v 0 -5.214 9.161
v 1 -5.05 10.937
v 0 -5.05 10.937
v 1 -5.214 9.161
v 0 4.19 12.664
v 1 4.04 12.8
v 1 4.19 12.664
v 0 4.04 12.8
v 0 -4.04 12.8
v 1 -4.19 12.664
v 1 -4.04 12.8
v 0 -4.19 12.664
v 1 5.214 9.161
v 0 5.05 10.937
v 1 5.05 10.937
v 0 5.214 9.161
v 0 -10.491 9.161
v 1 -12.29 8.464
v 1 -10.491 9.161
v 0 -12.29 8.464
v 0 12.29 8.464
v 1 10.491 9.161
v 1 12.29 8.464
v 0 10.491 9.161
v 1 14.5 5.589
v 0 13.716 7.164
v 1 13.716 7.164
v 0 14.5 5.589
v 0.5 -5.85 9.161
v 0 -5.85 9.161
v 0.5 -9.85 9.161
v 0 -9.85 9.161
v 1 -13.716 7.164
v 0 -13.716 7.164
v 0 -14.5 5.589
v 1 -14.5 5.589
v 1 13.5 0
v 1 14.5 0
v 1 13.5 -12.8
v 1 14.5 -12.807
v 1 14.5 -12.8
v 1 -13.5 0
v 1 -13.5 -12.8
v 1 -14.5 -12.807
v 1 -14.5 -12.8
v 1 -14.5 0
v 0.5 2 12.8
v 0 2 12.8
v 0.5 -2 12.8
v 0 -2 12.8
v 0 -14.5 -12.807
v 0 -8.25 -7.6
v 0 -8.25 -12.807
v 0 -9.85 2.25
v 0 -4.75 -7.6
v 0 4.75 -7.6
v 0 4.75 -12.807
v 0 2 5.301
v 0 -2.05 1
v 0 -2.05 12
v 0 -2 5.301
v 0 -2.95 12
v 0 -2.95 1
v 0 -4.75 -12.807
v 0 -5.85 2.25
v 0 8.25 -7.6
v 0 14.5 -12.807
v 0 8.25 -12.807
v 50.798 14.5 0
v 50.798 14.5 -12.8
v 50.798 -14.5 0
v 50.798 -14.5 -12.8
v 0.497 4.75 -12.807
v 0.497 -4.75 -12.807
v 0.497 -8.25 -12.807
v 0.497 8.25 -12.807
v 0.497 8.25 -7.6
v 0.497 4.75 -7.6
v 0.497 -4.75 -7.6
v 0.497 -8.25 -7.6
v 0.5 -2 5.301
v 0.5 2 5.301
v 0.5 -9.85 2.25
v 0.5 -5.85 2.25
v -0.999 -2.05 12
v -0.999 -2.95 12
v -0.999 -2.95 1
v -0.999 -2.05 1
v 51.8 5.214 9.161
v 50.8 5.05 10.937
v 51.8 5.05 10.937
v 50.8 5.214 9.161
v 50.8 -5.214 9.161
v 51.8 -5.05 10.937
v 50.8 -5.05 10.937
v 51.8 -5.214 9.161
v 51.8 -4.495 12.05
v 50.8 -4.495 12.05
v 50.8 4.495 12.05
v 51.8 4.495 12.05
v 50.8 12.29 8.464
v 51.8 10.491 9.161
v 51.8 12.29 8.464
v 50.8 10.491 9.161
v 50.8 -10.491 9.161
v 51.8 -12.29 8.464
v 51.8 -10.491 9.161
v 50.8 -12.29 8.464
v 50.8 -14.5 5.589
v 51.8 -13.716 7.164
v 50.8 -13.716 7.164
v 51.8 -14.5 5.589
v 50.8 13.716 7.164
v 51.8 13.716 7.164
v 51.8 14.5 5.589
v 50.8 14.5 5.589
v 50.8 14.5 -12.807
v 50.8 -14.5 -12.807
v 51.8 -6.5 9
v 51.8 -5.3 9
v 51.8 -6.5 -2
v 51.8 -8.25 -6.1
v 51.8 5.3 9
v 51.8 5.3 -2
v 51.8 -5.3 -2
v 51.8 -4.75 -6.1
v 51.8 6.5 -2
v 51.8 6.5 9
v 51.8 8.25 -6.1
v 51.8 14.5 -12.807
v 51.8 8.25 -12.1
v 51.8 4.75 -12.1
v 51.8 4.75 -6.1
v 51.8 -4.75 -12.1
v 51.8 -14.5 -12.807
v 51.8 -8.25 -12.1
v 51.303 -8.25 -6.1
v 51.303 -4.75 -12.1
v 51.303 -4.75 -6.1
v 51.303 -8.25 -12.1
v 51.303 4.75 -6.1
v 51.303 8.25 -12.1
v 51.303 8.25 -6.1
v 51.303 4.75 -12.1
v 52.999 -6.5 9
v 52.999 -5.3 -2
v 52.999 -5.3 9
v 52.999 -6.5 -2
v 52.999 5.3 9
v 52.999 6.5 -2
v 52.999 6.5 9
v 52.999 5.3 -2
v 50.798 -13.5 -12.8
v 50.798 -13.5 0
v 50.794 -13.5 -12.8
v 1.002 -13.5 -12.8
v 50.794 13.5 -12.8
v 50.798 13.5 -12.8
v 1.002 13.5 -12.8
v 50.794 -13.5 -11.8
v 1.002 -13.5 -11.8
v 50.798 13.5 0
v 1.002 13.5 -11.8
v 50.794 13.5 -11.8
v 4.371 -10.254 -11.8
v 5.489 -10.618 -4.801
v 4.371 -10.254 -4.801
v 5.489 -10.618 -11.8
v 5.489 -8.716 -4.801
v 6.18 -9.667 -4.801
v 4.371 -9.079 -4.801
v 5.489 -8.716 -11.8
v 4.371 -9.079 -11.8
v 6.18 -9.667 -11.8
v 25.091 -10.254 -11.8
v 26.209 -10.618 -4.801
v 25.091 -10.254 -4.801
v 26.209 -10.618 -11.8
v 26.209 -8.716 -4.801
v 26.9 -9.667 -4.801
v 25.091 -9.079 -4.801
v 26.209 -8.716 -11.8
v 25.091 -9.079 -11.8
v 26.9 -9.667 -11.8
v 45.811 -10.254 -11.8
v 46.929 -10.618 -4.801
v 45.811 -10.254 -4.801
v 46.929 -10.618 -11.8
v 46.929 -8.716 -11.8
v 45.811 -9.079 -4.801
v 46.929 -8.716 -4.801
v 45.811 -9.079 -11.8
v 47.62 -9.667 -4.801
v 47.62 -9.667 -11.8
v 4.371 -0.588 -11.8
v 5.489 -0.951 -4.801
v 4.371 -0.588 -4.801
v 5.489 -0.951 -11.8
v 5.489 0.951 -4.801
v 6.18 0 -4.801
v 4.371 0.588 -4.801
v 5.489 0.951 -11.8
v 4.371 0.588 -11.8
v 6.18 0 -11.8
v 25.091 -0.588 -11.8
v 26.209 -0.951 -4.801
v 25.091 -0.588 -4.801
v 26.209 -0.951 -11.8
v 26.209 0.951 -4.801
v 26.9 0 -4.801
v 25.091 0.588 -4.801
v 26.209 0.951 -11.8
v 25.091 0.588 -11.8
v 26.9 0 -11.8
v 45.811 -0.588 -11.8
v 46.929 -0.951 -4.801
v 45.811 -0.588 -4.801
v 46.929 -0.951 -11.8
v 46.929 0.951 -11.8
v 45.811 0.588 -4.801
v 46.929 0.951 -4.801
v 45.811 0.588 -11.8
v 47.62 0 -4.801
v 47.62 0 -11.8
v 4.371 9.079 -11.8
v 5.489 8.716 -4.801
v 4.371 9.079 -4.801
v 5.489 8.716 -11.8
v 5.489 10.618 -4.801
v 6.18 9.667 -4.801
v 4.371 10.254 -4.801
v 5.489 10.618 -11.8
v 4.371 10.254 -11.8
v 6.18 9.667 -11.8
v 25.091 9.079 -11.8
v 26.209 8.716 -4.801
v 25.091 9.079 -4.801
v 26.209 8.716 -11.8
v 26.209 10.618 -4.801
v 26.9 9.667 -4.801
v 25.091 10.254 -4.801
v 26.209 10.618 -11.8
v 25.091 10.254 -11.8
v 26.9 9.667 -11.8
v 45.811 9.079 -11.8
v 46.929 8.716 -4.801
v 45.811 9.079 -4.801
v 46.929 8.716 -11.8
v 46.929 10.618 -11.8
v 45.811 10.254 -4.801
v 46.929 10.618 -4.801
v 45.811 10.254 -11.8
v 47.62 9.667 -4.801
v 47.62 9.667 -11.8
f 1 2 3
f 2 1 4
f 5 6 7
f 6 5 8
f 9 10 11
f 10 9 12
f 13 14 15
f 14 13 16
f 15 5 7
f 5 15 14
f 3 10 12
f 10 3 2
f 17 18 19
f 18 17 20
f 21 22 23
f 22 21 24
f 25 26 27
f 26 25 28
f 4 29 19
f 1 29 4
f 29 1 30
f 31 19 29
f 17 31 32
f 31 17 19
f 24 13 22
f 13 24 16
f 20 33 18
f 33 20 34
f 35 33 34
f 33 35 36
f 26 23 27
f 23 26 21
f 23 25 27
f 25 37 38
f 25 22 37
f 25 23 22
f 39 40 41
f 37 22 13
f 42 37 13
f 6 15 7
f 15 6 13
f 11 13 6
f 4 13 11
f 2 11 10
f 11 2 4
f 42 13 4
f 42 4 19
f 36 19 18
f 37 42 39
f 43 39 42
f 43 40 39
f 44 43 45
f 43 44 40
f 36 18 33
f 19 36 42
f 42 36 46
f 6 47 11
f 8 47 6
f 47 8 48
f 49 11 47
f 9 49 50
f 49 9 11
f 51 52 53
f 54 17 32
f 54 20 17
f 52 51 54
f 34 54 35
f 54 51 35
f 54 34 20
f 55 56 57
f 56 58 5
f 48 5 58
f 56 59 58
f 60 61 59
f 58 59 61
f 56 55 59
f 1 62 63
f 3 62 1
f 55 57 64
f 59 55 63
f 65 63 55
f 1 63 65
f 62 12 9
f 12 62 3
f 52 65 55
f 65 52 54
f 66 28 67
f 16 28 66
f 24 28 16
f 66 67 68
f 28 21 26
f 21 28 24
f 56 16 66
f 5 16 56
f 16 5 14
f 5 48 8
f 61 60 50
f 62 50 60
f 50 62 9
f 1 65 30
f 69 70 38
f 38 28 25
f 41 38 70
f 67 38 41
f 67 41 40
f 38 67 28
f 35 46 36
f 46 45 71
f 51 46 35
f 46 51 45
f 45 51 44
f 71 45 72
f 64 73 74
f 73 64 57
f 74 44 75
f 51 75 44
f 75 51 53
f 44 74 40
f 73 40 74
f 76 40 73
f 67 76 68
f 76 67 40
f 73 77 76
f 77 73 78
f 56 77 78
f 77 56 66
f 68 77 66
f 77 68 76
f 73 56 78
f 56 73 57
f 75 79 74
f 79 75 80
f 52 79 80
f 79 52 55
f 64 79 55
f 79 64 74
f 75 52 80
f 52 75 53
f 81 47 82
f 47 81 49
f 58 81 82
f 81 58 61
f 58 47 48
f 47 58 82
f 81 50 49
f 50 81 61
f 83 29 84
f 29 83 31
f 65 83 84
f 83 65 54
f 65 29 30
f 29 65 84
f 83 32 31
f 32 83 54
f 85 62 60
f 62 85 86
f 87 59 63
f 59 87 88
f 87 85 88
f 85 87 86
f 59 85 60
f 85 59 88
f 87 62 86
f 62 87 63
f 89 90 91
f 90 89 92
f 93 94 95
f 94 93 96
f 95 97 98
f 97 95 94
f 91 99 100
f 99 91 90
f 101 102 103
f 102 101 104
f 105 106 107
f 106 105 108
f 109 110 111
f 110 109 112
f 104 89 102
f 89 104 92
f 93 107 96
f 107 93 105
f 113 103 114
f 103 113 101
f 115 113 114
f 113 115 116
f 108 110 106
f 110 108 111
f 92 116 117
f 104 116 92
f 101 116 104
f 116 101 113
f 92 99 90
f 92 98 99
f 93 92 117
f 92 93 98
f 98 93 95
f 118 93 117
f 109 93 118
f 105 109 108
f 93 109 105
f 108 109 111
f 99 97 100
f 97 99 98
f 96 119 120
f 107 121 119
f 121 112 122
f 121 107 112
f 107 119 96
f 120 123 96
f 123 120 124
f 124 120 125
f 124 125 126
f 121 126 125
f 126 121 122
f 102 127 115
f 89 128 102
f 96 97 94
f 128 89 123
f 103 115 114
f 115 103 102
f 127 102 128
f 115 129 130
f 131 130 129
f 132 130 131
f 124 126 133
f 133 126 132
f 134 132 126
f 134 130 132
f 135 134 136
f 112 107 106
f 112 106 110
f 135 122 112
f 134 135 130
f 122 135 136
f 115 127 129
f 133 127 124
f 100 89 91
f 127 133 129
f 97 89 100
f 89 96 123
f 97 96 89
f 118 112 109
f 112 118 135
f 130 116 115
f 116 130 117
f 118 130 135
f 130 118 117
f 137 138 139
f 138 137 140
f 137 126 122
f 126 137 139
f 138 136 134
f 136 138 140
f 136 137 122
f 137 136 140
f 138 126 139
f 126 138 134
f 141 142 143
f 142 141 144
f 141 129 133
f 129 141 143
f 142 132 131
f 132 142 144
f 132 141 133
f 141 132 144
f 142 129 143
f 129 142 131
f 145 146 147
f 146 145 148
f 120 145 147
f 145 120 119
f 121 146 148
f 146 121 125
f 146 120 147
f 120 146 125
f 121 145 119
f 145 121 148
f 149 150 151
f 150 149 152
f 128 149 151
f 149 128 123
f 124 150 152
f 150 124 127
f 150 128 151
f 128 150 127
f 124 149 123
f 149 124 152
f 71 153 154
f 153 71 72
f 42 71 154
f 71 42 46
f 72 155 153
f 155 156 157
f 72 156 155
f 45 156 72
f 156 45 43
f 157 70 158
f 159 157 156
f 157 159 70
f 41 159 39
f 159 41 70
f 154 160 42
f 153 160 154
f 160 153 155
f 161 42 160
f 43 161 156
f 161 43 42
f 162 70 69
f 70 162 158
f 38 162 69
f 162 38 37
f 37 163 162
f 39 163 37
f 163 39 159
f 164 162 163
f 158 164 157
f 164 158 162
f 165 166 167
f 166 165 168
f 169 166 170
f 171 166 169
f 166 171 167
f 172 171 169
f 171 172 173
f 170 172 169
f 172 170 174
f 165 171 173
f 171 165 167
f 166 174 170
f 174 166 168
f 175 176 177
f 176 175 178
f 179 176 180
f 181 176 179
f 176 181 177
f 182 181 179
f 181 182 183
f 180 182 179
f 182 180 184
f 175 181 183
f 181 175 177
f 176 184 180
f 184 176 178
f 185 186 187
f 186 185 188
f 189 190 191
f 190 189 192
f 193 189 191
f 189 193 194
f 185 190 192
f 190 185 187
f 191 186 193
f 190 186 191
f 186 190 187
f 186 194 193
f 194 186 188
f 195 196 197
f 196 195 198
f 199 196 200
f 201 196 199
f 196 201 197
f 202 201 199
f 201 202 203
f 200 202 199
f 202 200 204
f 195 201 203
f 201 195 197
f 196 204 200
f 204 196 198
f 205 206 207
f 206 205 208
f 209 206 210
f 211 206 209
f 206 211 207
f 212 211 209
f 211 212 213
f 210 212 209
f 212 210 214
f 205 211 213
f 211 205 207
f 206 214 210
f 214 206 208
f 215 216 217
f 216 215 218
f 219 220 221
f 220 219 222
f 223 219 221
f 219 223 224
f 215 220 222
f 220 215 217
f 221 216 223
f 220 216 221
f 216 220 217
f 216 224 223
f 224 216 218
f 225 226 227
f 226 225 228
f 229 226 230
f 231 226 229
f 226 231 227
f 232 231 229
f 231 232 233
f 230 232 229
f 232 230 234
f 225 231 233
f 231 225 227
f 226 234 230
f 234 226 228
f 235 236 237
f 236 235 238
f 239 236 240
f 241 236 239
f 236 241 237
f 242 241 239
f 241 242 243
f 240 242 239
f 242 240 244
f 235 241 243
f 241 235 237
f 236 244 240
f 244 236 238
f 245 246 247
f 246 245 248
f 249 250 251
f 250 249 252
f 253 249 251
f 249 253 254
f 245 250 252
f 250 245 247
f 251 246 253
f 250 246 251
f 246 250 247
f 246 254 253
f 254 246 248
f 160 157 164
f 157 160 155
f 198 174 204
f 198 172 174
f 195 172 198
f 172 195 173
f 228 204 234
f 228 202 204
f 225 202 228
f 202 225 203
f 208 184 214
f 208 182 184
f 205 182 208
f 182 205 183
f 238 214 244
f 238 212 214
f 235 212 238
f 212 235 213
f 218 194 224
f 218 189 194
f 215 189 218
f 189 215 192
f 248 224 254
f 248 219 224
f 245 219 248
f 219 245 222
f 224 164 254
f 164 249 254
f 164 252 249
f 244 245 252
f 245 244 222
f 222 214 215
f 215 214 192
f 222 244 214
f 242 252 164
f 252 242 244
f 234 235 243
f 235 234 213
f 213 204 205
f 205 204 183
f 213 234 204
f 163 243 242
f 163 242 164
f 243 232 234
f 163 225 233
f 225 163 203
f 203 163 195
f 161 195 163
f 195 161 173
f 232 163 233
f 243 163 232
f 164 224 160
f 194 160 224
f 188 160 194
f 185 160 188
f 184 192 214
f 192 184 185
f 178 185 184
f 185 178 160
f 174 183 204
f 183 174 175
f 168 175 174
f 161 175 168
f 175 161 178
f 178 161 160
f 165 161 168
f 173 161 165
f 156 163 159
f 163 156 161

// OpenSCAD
// file: uploads_f1_eb_f2_54_dd_Batteries.scad
/*
 * "Batteries in OpenSCAD by roman_hegglin"
 * https://www.thingiverse.com/thing:155722
 */
/*$fn=70;*/

AA();
translate( v=[15,0,0])
AAA();
translate( v=[35,0,0])
C();
translate( v=[68,0,0])
D();
translate( v=[90,-0.5*(17.5-2*2),0])
9V();
translate( v=[130,0,0])
45V();


module AA()
{
battery_round(50.5, 14.5, 1.0, 5.5);
}

module AAA()
{
battery_round(44.5, 10.5, 0.8, 3.8);
}

module C()
{
battery_round(50, 26.2, 1.5, 7.5);
}

module D()
{
battery_round(61.5, 34.2, 1.5, 9.5);
}

module 9V()
{
r=2;
union(){
	translate(v = [(26.5-2*r)/2-12.95/2, (17.5-2*r)/2, 46.4]) {
		cylinder(h = 48.5-46.4, r=3);
	}

	translate(v = [(26.5-2*r)/2+12.95/2, (17.5-2*r)/2, 46.4]) {
		for ( i = [0:3])
			{ rotate ( i * 60, [0,0,1])
				cube([7.79,4.5,(48.5-46.4)*2],center = true);
			}
		
	}

	minkowski()
	{
	 cube([26.5-2*r,17.5-2*r,46.4/2]);
	 cylinder(r=r,h=46.4/2);
}
}
}

module 45V()
{
h=67;
w=22;
l=62;



minkowski()
{
 cube([l-w/2,0.1,h/2]);
 cylinder(r=w/2,h=h/2);
}

}

module battery_round(h, dia, h_con, dia_con)
{
union() {
	cylinder(h = h-h_con, r=dia/2);
	translate(v = [0, 0, h-h_con]) {
		cylinder(h = h_con, r=dia_con/2);
	}
}
}
// main file
/*
 * 9V cell adapter for lego powered up trains. Front has contacts.
 */
 
 /*
  * It's made of 6xAAAs.
  * 
  * The casing has about 0.5mm tolerance around the AAA diameter.
  */
AAA_battery_diameter = 10.5;
AAA_battery_length = 44.5;

// Space caddy allows between battery and edge of spacer, approx
battery_diameter_tolerance = 0.5;
// Z-gap between batteries in the layers
pack_battery_height_gap = 1;

end_wall_thickness = 1;
base_thickness = 1;
side_wall_thickness = 1;


// The entire control box case exterior is 63.8 long

//base_length_outside_to_outside = AAA_battery_length + end_wall_thickness * 2;
base_length_outside_to_outside = 51.8;

front_height_total = 25.6;
front_width_total = 29.0;

/* Back has a cutout lower than front, seems to be part of the keying */
back_height_total = 24.1;
back_width_total = front_width_total;

clip_inset = 6.0;
clip_width = 3.5;
// Should be about 10mm between the clips
clip_gap = front_width_total - 2*(clip_inset*clip_width);
clip_height = 3.0;
// Gap between clip slide and notch
clip_to_notch_height = 1.0;
// Notch starts at +4mm, goes to +6mm, is same width as clip
notch_height = 2.0;


/* Key ridge on front is actually 12.73 high but falls on a curve. So we'll make the key shorter. */
key_ridge_front_height = 11.0; /* TODO measure */
key_ridge_front_zoff = 1;
key_ridge_front_width = 1;
key_ridge_front_depth = 0.9;
/* Its inner (left) edge is 12 - key_ridge_depth from the right edge. This offset is key ridge centre from box centre. */
key_ridge_front_yoff = -(front_width_total/2 - (12.0  - key_ridge_front_depth/2));

/* back ridges are slightly bigger */
key_ridge_back_width = 1.2;
key_ridge_back_depth = 1.2;
/* The real one follows the curve of the battery and is 14.8 high but we can just make it a bit shorter */
key_ridge_back_height = 11.0;
/* The inside of each ridge is 8mm from the corresponding edge */
key_ridge_back_yoff = back_width_total / 2 - key_ridge_back_width/2 - 8;
key_ridge_back_zoff = -2;

contact_width = 4.0;
contact_height = 7.5;
contact_depth = 2;

contact_positive_yoff = 0;

/* Right edge of contact cutout is 4.65 from right outside wall */
contact_negative_yoff = -(front_width_total/2 - contact_width/2) + 4.65;

contact_negative_zoff = 6; /* approx is ok here */

battery_standoff_feet_height = 7;
battery_standoff_feet_d = 2;

E=0.001;

/* Preview using AAA or 9V */
//preview_with_aaa = true;
preview_with_aaa = false;

use <uploads_f1_eb_f2_54_dd_Batteries.scad>;

module AAA_cell() {
    rotate([0,90,0])
    AAA();
};

all_batteries = ["t","b","bl","br","tl","tr"];

module batteries_AAA(which=all_batteries)
{
    let(batt_space = AAA_battery_diameter + battery_diameter_tolerance)
    for (pack_zoff = [0, AAA_battery_diameter + pack_battery_height_gap])
    translate([0,0,pack_zoff])
    {
        let(batt_name = (pack_zoff == 0 ? "b" : "t"))
        {
            //echo(pack_zoff, batt_name);
            
            if ([ for (w = which) if (w == batt_name) w])
            AAA_cell();
        }

        for (lr=[-1,1])
        let(batt_name = str((pack_zoff == 0 ? "b" : "t"), (lr == -1 ? "l" : "r")))
        {
            //echo(pack_zoff, lr, batt_name);
            
            if ([ for (w = which) if (w == batt_name) w])
            translate([0,
                lr*cos(-30)*batt_space,
                sin(-30)*batt_space])
            AAA_cell();
        }
    }
}

module batteries_9V() {
    translate([base_length_outside_to_outside,0,0])
    rotate([180,0,0])
    translate([-5,-11.5,8])
    rotate([0,-90,0])
    rotate([0,0,90])
    9V();
}

module key_ridge_front() {
    cube([key_ridge_front_width, key_ridge_front_depth, key_ridge_front_height]);
}

module key_ridge_back() {
    cube([key_ridge_back_width, key_ridge_back_depth, key_ridge_back_height]);
}


module contact() {
    cube([contact_depth, contact_width, contact_height], center=true);
}

module end_plate(end_plate_height) {
    let(
        pack_cube_h = 2 * AAA_battery_diameter + pack_battery_height_gap
    )
    translate([end_wall_thickness,0,0])
    difference() {
        union() {
            intersection() {
                translate([-end_wall_thickness,0,-2])
                {
                    hull()
                    batteries_AAA(which=[ for (w = all_batteries) if (w != "t") w ]);
                    batteries_AAA(which=["t"]);
                }

                /* main body */
                cube([
                        end_wall_thickness,
                        front_width_total,
                        end_plate_height
                    ],
                    center=true
                );
            };
            
            /* Square off bottom */
            translate([0,0,-pack_cube_h/2+AAA_battery_diameter/3.05]) /* HACK */
            cube([1, front_width_total, AAA_battery_diameter], center=true);
        };
        
        /* clip notches */
        for (lr = [-1,1])
        translate([0, lr * (clip_gap/2), clip_inset])
        translate([-end_wall_thickness/2-3*E,-clip_width/2,-end_plate_height + clip_inset])
        cube([0.5, clip_width, clip_inset]);
    }
}

module front_plate() {
    translate([-end_wall_thickness/2,0,0])
    union()
    {
        difference()
        {
            end_plate(front_height_total);
             
            // +ve contact (centre)
            translate([
                0,
                contact_positive_yoff,
                front_height_total/2 - contact_height/2+E
            ])
            contact();

            // -ve contact (right)
            translate([
                0,
                contact_negative_yoff,
                contact_negative_zoff
            ])
            contact();
        }
        
        // Front key ridge
        translate([
            - key_ridge_front_width/2 + E,
            key_ridge_front_yoff,
            key_ridge_front_zoff
        ])
        key_ridge_front();
    }
}

module back_plate() {
    translate([end_wall_thickness/2,0,0])
    union()
    {
        rotate([0,0,180])
        end_plate(back_height_total);
        
        // Back key ridge
        for (lr=[-1,1])
        translate([
            -end_wall_thickness/2-E,
            key_ridge_back_yoff * lr,
            key_ridge_back_zoff
        ])
        translate([0,-key_ridge_back_depth/2,0])
        key_ridge_back();
    }
}

module base_plate() {
    translate([end_wall_thickness+2*E, -front_width_total/2, 0])
    cube([
        base_length_outside_to_outside - 2*end_wall_thickness - 8*E,
        front_width_total-2*E,
        base_thickness
    ]);
}

module sidewall() {
    translate([end_wall_thickness, -side_wall_thickness/2, 0])
    cube([
        base_length_outside_to_outside - 2*end_wall_thickness -2*E,
        side_wall_thickness,
        front_height_total/2
    ]);
}

union() {
    /* Front end plate */
    front_plate();
    
    /* Rear end plate */
    translate([base_length_outside_to_outside, 0, 0])
    back_plate();
    
    /* Base */
    translate([0,0,-front_height_total/2])
    base_plate();
    
    /* Side walls */
    for(lr = [-1, 1])
    translate([
        0,
        (front_width_total/2 - side_wall_thickness/2) * lr,
        -front_height_total/2
    ])
    sidewall();
    
    /* Feet to raise 9v battery up, since we want it in the top */
    for (lr = [-1,0,1], fb = [0,0.5,1])
    translate([
        base_length_outside_to_outside*0.8 * fb,
        front_width_total/3 * lr,
        0
    ])
    translate([
        base_length_outside_to_outside*0.1,
        0,
        -front_height_total/2 + base_thickness - E
    ])
    cylinder(h=battery_standoff_feet_height, d=battery_standoff_feet_d);
}


/* Show batteries */
%
color("blue",0.2)
translate([
    (base_length_outside_to_outside - AAA_battery_length)/2,
    0,
    -2
])
if (preview_with_aaa) {
    batteries_AAA();
} else {
    translate([0,0,battery_standoff_feet_height])
    batteries_9V();
}
